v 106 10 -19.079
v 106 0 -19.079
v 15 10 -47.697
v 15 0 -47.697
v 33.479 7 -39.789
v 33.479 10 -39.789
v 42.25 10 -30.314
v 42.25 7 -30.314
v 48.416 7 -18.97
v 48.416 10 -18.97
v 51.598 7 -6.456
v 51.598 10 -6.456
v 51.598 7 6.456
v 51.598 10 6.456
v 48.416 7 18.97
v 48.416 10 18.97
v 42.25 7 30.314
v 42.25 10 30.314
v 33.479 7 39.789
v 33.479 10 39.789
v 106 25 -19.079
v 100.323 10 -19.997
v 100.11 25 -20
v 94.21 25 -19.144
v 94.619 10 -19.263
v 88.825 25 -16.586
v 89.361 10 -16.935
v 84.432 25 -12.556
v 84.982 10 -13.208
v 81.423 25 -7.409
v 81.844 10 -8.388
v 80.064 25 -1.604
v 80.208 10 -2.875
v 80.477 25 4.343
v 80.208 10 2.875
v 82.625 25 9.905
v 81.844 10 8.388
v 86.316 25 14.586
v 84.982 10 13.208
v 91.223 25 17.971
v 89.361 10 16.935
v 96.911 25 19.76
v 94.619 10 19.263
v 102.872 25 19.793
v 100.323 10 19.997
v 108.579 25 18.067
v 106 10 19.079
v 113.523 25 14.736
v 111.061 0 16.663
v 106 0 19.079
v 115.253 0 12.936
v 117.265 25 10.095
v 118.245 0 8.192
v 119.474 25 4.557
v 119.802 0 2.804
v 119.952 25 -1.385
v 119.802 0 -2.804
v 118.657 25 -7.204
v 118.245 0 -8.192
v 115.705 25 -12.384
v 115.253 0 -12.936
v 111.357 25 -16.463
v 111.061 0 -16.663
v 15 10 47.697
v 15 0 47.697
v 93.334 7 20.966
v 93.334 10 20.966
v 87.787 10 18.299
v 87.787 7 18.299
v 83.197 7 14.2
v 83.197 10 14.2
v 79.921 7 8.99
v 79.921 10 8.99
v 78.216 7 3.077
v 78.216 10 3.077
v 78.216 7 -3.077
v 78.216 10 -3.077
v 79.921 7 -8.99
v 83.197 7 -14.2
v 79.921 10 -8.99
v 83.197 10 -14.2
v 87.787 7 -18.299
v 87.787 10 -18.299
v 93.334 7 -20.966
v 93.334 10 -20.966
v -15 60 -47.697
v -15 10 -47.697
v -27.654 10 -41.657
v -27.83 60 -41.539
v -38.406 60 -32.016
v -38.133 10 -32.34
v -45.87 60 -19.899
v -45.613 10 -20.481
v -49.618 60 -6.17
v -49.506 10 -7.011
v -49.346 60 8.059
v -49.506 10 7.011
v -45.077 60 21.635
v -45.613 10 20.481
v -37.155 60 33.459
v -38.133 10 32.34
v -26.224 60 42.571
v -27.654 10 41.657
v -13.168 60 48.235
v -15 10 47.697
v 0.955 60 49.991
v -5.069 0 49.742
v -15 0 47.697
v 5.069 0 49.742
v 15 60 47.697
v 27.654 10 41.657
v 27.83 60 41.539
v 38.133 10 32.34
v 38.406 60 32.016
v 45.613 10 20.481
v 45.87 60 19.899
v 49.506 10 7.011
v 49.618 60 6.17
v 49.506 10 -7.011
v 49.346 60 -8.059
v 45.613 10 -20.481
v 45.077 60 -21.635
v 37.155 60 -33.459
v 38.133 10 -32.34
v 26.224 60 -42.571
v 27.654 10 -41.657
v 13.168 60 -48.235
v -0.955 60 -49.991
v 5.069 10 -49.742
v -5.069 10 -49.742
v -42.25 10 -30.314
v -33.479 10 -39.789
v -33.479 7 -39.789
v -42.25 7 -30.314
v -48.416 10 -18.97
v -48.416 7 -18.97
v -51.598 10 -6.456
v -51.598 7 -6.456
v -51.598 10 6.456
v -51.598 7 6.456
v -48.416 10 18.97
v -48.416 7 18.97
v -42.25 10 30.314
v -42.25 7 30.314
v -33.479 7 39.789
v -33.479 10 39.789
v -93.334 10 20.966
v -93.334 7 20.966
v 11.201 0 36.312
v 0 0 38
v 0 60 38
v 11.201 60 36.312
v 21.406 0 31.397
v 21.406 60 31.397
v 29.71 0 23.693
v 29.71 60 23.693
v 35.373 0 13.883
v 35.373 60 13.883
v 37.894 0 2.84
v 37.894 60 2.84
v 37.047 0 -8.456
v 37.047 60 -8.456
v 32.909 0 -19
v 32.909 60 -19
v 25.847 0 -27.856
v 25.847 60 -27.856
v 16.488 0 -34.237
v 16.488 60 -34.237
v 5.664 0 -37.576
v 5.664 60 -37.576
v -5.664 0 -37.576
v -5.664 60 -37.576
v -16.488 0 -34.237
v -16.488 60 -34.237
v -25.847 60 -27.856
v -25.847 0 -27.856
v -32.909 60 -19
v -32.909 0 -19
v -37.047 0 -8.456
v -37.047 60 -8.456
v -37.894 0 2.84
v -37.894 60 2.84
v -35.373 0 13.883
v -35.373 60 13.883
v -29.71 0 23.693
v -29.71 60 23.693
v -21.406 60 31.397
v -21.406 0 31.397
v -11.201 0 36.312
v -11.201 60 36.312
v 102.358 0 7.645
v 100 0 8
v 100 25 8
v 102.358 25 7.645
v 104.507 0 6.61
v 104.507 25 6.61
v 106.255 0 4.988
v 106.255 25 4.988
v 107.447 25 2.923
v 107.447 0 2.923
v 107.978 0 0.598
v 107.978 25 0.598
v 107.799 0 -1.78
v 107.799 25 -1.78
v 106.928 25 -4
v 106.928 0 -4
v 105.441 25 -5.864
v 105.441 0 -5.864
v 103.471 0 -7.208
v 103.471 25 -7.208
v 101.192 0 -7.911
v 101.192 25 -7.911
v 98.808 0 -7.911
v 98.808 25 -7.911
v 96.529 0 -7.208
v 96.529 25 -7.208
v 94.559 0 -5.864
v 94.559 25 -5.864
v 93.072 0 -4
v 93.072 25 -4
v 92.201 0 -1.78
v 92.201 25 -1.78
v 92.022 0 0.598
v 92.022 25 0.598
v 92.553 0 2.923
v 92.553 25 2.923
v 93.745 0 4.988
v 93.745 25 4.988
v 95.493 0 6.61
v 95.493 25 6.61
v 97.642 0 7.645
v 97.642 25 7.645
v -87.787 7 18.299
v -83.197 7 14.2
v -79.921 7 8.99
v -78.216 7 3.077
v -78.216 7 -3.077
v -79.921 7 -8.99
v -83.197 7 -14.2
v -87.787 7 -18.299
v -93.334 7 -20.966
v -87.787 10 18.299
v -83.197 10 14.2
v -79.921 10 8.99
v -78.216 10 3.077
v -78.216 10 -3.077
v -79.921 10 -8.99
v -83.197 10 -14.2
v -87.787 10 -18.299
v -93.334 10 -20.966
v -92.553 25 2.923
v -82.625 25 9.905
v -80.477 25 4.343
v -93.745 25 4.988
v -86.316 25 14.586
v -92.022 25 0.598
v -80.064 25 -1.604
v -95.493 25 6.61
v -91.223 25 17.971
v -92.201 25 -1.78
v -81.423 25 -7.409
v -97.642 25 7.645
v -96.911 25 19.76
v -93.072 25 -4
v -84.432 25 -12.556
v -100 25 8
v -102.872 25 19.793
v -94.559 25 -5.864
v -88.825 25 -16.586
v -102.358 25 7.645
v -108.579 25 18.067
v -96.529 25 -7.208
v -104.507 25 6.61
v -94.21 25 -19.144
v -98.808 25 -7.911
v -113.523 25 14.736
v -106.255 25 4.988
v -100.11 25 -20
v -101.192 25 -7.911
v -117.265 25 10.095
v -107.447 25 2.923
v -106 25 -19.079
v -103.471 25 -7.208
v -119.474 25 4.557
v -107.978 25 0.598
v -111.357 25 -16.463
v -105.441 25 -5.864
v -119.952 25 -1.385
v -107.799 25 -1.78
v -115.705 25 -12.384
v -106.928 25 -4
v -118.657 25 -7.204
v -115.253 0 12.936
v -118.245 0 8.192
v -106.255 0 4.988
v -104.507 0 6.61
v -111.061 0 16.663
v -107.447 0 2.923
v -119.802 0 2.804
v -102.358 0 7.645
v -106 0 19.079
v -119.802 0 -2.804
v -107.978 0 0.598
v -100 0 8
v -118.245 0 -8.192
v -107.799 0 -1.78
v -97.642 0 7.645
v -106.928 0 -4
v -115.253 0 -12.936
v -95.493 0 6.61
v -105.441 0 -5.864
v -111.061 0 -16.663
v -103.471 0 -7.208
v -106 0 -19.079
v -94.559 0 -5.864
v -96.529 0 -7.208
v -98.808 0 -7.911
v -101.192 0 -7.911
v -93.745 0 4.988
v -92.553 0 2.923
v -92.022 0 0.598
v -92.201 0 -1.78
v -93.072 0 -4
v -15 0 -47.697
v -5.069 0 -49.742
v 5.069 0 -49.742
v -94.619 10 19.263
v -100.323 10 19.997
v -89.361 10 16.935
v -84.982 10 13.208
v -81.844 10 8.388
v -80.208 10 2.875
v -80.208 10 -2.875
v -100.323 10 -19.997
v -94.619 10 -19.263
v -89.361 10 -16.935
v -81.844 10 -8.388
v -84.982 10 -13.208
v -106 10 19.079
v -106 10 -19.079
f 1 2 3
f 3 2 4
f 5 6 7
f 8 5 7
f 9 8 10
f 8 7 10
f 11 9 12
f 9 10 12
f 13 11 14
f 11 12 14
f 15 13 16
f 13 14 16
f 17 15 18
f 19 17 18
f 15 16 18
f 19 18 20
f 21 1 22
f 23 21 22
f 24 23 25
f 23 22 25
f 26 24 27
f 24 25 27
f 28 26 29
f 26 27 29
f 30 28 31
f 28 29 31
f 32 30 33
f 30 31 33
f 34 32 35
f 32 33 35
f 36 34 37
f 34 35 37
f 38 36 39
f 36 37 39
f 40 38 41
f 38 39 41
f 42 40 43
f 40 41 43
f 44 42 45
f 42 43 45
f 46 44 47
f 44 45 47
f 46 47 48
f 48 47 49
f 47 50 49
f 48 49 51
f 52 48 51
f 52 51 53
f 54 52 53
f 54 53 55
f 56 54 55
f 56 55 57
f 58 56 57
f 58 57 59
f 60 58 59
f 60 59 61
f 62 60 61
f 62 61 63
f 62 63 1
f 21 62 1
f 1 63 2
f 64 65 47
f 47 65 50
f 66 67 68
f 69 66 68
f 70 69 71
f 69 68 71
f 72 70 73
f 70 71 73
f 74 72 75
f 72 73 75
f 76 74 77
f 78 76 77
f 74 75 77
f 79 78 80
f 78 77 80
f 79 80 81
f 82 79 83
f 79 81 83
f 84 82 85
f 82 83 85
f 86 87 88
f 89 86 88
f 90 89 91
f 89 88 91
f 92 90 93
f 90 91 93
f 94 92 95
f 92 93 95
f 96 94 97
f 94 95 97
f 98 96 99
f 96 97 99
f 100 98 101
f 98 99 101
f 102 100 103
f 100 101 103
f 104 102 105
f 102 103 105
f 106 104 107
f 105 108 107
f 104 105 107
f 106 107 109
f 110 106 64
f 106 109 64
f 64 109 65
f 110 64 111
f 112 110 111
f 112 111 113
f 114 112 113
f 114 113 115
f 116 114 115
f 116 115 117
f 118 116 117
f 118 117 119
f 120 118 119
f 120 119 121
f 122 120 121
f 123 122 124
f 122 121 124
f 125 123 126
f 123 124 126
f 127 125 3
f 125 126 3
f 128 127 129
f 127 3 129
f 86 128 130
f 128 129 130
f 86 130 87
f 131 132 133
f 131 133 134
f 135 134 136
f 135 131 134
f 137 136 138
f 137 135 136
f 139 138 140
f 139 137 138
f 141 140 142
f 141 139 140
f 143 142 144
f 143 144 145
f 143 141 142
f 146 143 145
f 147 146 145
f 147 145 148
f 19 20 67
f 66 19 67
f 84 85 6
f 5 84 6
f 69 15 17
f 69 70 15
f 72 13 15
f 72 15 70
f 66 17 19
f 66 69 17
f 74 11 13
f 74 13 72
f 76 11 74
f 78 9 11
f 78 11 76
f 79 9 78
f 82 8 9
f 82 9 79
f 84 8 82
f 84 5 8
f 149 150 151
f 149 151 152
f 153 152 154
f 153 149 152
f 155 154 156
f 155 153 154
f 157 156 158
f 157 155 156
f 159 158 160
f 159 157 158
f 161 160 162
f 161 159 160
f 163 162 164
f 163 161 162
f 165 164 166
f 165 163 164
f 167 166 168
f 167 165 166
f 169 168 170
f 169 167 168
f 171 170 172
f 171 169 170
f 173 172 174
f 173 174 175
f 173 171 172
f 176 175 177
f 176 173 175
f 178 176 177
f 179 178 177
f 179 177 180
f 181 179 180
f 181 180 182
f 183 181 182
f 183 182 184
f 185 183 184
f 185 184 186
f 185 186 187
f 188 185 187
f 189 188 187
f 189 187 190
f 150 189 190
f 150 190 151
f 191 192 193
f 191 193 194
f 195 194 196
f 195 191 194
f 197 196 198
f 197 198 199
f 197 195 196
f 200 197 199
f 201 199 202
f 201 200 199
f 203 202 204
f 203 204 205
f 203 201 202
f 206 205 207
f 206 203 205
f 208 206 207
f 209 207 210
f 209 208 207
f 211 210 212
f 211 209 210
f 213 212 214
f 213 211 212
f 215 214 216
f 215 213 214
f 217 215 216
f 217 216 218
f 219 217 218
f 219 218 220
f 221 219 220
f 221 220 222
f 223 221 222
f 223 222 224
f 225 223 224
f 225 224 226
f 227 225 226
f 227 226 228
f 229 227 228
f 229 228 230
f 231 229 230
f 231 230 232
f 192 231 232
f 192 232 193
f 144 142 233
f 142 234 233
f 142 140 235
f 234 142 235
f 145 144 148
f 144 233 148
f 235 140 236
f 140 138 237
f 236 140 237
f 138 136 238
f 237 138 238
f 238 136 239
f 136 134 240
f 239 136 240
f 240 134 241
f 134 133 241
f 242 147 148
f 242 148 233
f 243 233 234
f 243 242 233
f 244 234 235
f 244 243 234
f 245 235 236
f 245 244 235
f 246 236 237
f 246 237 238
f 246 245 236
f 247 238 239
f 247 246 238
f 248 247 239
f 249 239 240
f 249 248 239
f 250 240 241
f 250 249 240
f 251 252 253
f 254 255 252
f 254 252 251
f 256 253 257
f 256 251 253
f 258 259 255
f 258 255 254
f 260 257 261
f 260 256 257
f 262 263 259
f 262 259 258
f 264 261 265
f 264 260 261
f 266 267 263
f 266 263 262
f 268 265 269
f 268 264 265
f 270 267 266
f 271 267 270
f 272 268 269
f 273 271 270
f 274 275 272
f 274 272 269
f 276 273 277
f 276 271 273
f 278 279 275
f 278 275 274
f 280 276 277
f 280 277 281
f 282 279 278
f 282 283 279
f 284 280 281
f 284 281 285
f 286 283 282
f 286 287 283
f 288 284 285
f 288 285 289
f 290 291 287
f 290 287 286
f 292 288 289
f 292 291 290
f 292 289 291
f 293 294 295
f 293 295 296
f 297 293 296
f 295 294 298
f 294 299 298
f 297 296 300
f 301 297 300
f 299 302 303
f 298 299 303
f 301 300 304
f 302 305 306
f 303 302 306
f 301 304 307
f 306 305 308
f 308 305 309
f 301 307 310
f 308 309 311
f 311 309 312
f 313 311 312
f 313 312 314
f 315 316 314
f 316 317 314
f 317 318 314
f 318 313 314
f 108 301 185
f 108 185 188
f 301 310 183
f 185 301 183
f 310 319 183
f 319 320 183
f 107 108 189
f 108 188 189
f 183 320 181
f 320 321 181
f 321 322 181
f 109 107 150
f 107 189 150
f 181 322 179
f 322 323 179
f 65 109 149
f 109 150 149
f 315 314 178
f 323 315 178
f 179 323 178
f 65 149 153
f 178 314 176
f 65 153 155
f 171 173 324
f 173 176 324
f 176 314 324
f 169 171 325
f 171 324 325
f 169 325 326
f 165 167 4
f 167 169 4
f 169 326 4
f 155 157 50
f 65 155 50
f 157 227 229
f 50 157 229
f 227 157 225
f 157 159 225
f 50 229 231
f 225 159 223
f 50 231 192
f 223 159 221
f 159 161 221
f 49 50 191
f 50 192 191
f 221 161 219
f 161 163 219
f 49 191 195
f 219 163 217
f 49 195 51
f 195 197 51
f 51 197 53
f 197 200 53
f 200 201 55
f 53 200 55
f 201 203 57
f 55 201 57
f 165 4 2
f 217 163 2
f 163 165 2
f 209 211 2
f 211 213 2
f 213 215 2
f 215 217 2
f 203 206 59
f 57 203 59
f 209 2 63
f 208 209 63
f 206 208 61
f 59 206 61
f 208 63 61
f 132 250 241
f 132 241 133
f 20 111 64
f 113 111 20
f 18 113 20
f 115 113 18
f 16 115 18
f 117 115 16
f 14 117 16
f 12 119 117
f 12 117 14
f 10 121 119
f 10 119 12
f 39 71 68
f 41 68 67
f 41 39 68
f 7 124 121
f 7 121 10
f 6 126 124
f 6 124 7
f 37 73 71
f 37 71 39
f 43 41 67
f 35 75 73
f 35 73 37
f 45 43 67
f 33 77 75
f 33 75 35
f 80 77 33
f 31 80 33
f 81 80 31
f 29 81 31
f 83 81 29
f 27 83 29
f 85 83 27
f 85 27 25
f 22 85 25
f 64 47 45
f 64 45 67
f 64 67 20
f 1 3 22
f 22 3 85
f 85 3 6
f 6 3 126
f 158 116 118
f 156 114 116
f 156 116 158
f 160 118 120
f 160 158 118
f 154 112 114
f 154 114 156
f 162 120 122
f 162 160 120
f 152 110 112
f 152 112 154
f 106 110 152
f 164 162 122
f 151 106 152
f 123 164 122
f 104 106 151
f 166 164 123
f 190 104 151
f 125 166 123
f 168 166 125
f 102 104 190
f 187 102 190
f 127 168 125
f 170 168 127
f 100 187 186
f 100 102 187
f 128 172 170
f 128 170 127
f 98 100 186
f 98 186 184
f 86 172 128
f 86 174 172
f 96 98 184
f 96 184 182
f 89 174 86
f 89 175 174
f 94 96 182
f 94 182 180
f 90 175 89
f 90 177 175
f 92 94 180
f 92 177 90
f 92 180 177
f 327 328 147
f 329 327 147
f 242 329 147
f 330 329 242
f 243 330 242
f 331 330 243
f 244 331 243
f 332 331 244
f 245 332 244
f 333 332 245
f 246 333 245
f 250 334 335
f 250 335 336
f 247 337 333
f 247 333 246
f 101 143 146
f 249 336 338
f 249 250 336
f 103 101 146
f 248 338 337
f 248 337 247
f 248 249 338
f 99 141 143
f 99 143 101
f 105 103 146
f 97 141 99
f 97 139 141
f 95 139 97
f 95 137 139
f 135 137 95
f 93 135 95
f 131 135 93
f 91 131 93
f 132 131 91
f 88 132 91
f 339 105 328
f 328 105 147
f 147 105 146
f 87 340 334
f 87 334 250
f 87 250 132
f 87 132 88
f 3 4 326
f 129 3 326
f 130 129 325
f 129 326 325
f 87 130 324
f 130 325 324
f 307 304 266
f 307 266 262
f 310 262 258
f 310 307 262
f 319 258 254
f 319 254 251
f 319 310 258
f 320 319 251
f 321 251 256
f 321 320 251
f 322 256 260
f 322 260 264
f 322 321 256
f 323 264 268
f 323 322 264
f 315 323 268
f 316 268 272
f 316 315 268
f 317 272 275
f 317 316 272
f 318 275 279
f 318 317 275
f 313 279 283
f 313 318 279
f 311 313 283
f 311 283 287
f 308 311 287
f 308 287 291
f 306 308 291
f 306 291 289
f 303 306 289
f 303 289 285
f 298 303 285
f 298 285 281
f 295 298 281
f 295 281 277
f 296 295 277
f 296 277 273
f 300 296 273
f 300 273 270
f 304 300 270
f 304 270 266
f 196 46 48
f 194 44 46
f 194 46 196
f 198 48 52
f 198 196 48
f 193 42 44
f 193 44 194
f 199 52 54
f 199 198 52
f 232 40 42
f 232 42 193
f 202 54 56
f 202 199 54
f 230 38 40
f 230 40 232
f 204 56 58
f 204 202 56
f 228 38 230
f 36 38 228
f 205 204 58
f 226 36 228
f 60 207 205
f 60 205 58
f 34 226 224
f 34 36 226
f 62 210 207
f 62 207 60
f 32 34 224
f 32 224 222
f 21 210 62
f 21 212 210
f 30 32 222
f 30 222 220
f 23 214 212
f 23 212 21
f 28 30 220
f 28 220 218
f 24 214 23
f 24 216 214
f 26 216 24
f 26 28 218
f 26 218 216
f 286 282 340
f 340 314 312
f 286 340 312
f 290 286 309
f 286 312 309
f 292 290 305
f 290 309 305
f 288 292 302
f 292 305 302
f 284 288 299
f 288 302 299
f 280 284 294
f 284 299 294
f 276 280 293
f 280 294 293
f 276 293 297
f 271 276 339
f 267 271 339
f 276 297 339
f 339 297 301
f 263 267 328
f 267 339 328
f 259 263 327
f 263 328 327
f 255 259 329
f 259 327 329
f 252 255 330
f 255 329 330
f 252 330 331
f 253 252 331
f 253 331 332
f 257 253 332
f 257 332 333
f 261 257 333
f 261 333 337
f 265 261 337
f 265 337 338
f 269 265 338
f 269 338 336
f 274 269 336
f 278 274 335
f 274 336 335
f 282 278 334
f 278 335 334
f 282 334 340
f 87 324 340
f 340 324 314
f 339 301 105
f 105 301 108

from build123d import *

# Parameters (mm, degrees)
SKETCH1_R           = 8
SKETCH1_R_2         = 38
BOSS_EXTRUDE1_DEPTH = 10
SKETCH1_3_R         = 20
SKETCH1_3_R_2       = 8
BOSS_EXTRUDE2_DEPTH = 25
SKETCH1_4_R         = 38
BOSS_EXTRUDE3_DEPTH = 60
CUT_EXTRUDE1_DEPTH  = 3


with BuildPart() as part:
    # Sketch1 → Boss-Extrude1 (new body)
    with BuildSketch(Plane(origin=(0, 0, 0), x_dir=(1, 0, 0), z_dir=(0, 1, 0))):
        with BuildLine():
            Line((106, 19.078784028), (15, 47.696960071))
            ThreePointArc((15, 47.696960071), (0, 50), (-15, 47.696960071))
            Line((-15, 47.696960071), (-106, 19.078784028))
            ThreePointArc((-106, 19.078784028), (-120, 0), (-106, -19.078784028))
            Line((-106, -19.078784028), (-15, -47.696960071))
            ThreePointArc((-15, -47.696960071), (0, -50), (15, -47.696960071))
            Line((15, -47.696960071), (106, -19.078784028))
            ThreePointArc((106, -19.078784028), (120, 0), (106, 19.078784028))
        make_face()
        with Locations((100, 0)):
            Circle(SKETCH1_R, mode=Mode.SUBTRACT)
        Circle(SKETCH1_R_2, mode=Mode.SUBTRACT)
        with Locations((-100, 0)):
            Circle(SKETCH1_R, mode=Mode.SUBTRACT)
    extrude(amount=BOSS_EXTRUDE1_DEPTH)

    # Sketch1<3> → Boss-Extrude2 (add)
    # profile 1 of 2: a face of its own
    with BuildSketch(Plane(origin=(0, 0, 0), x_dir=(1, 0, 0), z_dir=(0, 1, 0))):
        with Locations((100, 0)):
            Circle(SKETCH1_3_R)
        with Locations((100, 0)):
            Circle(SKETCH1_3_R_2, mode=Mode.SUBTRACT)
    # profile 2 of 2: a face of its own
    with BuildSketch(Plane(origin=(0, 0, 0), x_dir=(1, 0, 0), z_dir=(0, 1, 0))):
        with Locations((-100, 0)):
            Circle(SKETCH1_3_R)
        with Locations((-100, 0)):
            Circle(SKETCH1_3_R_2, mode=Mode.SUBTRACT)
    extrude(amount=BOSS_EXTRUDE2_DEPTH)

    # Sketch1<4> → Boss-Extrude3 (add)
    with BuildSketch(Plane(origin=(0, 0, 0), x_dir=(1, 0, 0), z_dir=(0, 1, 0))):
        with BuildLine():
            ThreePointArc((50, 0), (40.311288741, 29.580398915), (15, 47.696960071))
            ThreePointArc((15, 47.696960071), (0, 50), (-15, 47.696960071))
            ThreePointArc((-15, 47.696960071), (-50, 0), (-15, -47.696960071))
            ThreePointArc((-15, -47.696960071), (0, -50), (15, -47.696960071))
            ThreePointArc((15, -47.696960071), (40.311288741, -29.580398915), (50, 0))
        make_face()
        Circle(SKETCH1_4_R, mode=Mode.SUBTRACT)
    extrude(amount=BOSS_EXTRUDE3_DEPTH)

    # Sketch5 → Cut-Extrude1 (cut)
    with BuildSketch(Plane(origin=(0, 10, 0), x_dir=(1, 0, 0), z_dir=(0, 1, 0))):
        with BuildLine():
            Line((-33.478784028, -39.789081668), (-93.333517497, -20.965638818))
            ThreePointArc((-93.333517497, -20.965638818), (-78, 0), (-93.333517497, 20.965638818))
            Line((-93.333517497, 20.965638818), (-33.478784028, 39.789081668))
            ThreePointArc((-33.478784028, 39.789081668), (-52, 0), (-33.478784028, -39.789081668))
        make_face()
        with BuildLine():
            Line((93.333517497, 20.965638818), (33.478784028, 39.789081668))
            ThreePointArc((33.478784028, 39.789081668), (52, 0), (33.478784028, -39.789081668))
            Line((33.478784028, -39.789081668), (93.333517497, -20.965638818))
            ThreePointArc((93.333517497, -20.965638818), (78, 0), (93.333517497, 20.965638818))
        make_face()
    extrude(amount=-CUT_EXTRUDE1_DEPTH, mode=Mode.SUBTRACT)


solid = part.part
